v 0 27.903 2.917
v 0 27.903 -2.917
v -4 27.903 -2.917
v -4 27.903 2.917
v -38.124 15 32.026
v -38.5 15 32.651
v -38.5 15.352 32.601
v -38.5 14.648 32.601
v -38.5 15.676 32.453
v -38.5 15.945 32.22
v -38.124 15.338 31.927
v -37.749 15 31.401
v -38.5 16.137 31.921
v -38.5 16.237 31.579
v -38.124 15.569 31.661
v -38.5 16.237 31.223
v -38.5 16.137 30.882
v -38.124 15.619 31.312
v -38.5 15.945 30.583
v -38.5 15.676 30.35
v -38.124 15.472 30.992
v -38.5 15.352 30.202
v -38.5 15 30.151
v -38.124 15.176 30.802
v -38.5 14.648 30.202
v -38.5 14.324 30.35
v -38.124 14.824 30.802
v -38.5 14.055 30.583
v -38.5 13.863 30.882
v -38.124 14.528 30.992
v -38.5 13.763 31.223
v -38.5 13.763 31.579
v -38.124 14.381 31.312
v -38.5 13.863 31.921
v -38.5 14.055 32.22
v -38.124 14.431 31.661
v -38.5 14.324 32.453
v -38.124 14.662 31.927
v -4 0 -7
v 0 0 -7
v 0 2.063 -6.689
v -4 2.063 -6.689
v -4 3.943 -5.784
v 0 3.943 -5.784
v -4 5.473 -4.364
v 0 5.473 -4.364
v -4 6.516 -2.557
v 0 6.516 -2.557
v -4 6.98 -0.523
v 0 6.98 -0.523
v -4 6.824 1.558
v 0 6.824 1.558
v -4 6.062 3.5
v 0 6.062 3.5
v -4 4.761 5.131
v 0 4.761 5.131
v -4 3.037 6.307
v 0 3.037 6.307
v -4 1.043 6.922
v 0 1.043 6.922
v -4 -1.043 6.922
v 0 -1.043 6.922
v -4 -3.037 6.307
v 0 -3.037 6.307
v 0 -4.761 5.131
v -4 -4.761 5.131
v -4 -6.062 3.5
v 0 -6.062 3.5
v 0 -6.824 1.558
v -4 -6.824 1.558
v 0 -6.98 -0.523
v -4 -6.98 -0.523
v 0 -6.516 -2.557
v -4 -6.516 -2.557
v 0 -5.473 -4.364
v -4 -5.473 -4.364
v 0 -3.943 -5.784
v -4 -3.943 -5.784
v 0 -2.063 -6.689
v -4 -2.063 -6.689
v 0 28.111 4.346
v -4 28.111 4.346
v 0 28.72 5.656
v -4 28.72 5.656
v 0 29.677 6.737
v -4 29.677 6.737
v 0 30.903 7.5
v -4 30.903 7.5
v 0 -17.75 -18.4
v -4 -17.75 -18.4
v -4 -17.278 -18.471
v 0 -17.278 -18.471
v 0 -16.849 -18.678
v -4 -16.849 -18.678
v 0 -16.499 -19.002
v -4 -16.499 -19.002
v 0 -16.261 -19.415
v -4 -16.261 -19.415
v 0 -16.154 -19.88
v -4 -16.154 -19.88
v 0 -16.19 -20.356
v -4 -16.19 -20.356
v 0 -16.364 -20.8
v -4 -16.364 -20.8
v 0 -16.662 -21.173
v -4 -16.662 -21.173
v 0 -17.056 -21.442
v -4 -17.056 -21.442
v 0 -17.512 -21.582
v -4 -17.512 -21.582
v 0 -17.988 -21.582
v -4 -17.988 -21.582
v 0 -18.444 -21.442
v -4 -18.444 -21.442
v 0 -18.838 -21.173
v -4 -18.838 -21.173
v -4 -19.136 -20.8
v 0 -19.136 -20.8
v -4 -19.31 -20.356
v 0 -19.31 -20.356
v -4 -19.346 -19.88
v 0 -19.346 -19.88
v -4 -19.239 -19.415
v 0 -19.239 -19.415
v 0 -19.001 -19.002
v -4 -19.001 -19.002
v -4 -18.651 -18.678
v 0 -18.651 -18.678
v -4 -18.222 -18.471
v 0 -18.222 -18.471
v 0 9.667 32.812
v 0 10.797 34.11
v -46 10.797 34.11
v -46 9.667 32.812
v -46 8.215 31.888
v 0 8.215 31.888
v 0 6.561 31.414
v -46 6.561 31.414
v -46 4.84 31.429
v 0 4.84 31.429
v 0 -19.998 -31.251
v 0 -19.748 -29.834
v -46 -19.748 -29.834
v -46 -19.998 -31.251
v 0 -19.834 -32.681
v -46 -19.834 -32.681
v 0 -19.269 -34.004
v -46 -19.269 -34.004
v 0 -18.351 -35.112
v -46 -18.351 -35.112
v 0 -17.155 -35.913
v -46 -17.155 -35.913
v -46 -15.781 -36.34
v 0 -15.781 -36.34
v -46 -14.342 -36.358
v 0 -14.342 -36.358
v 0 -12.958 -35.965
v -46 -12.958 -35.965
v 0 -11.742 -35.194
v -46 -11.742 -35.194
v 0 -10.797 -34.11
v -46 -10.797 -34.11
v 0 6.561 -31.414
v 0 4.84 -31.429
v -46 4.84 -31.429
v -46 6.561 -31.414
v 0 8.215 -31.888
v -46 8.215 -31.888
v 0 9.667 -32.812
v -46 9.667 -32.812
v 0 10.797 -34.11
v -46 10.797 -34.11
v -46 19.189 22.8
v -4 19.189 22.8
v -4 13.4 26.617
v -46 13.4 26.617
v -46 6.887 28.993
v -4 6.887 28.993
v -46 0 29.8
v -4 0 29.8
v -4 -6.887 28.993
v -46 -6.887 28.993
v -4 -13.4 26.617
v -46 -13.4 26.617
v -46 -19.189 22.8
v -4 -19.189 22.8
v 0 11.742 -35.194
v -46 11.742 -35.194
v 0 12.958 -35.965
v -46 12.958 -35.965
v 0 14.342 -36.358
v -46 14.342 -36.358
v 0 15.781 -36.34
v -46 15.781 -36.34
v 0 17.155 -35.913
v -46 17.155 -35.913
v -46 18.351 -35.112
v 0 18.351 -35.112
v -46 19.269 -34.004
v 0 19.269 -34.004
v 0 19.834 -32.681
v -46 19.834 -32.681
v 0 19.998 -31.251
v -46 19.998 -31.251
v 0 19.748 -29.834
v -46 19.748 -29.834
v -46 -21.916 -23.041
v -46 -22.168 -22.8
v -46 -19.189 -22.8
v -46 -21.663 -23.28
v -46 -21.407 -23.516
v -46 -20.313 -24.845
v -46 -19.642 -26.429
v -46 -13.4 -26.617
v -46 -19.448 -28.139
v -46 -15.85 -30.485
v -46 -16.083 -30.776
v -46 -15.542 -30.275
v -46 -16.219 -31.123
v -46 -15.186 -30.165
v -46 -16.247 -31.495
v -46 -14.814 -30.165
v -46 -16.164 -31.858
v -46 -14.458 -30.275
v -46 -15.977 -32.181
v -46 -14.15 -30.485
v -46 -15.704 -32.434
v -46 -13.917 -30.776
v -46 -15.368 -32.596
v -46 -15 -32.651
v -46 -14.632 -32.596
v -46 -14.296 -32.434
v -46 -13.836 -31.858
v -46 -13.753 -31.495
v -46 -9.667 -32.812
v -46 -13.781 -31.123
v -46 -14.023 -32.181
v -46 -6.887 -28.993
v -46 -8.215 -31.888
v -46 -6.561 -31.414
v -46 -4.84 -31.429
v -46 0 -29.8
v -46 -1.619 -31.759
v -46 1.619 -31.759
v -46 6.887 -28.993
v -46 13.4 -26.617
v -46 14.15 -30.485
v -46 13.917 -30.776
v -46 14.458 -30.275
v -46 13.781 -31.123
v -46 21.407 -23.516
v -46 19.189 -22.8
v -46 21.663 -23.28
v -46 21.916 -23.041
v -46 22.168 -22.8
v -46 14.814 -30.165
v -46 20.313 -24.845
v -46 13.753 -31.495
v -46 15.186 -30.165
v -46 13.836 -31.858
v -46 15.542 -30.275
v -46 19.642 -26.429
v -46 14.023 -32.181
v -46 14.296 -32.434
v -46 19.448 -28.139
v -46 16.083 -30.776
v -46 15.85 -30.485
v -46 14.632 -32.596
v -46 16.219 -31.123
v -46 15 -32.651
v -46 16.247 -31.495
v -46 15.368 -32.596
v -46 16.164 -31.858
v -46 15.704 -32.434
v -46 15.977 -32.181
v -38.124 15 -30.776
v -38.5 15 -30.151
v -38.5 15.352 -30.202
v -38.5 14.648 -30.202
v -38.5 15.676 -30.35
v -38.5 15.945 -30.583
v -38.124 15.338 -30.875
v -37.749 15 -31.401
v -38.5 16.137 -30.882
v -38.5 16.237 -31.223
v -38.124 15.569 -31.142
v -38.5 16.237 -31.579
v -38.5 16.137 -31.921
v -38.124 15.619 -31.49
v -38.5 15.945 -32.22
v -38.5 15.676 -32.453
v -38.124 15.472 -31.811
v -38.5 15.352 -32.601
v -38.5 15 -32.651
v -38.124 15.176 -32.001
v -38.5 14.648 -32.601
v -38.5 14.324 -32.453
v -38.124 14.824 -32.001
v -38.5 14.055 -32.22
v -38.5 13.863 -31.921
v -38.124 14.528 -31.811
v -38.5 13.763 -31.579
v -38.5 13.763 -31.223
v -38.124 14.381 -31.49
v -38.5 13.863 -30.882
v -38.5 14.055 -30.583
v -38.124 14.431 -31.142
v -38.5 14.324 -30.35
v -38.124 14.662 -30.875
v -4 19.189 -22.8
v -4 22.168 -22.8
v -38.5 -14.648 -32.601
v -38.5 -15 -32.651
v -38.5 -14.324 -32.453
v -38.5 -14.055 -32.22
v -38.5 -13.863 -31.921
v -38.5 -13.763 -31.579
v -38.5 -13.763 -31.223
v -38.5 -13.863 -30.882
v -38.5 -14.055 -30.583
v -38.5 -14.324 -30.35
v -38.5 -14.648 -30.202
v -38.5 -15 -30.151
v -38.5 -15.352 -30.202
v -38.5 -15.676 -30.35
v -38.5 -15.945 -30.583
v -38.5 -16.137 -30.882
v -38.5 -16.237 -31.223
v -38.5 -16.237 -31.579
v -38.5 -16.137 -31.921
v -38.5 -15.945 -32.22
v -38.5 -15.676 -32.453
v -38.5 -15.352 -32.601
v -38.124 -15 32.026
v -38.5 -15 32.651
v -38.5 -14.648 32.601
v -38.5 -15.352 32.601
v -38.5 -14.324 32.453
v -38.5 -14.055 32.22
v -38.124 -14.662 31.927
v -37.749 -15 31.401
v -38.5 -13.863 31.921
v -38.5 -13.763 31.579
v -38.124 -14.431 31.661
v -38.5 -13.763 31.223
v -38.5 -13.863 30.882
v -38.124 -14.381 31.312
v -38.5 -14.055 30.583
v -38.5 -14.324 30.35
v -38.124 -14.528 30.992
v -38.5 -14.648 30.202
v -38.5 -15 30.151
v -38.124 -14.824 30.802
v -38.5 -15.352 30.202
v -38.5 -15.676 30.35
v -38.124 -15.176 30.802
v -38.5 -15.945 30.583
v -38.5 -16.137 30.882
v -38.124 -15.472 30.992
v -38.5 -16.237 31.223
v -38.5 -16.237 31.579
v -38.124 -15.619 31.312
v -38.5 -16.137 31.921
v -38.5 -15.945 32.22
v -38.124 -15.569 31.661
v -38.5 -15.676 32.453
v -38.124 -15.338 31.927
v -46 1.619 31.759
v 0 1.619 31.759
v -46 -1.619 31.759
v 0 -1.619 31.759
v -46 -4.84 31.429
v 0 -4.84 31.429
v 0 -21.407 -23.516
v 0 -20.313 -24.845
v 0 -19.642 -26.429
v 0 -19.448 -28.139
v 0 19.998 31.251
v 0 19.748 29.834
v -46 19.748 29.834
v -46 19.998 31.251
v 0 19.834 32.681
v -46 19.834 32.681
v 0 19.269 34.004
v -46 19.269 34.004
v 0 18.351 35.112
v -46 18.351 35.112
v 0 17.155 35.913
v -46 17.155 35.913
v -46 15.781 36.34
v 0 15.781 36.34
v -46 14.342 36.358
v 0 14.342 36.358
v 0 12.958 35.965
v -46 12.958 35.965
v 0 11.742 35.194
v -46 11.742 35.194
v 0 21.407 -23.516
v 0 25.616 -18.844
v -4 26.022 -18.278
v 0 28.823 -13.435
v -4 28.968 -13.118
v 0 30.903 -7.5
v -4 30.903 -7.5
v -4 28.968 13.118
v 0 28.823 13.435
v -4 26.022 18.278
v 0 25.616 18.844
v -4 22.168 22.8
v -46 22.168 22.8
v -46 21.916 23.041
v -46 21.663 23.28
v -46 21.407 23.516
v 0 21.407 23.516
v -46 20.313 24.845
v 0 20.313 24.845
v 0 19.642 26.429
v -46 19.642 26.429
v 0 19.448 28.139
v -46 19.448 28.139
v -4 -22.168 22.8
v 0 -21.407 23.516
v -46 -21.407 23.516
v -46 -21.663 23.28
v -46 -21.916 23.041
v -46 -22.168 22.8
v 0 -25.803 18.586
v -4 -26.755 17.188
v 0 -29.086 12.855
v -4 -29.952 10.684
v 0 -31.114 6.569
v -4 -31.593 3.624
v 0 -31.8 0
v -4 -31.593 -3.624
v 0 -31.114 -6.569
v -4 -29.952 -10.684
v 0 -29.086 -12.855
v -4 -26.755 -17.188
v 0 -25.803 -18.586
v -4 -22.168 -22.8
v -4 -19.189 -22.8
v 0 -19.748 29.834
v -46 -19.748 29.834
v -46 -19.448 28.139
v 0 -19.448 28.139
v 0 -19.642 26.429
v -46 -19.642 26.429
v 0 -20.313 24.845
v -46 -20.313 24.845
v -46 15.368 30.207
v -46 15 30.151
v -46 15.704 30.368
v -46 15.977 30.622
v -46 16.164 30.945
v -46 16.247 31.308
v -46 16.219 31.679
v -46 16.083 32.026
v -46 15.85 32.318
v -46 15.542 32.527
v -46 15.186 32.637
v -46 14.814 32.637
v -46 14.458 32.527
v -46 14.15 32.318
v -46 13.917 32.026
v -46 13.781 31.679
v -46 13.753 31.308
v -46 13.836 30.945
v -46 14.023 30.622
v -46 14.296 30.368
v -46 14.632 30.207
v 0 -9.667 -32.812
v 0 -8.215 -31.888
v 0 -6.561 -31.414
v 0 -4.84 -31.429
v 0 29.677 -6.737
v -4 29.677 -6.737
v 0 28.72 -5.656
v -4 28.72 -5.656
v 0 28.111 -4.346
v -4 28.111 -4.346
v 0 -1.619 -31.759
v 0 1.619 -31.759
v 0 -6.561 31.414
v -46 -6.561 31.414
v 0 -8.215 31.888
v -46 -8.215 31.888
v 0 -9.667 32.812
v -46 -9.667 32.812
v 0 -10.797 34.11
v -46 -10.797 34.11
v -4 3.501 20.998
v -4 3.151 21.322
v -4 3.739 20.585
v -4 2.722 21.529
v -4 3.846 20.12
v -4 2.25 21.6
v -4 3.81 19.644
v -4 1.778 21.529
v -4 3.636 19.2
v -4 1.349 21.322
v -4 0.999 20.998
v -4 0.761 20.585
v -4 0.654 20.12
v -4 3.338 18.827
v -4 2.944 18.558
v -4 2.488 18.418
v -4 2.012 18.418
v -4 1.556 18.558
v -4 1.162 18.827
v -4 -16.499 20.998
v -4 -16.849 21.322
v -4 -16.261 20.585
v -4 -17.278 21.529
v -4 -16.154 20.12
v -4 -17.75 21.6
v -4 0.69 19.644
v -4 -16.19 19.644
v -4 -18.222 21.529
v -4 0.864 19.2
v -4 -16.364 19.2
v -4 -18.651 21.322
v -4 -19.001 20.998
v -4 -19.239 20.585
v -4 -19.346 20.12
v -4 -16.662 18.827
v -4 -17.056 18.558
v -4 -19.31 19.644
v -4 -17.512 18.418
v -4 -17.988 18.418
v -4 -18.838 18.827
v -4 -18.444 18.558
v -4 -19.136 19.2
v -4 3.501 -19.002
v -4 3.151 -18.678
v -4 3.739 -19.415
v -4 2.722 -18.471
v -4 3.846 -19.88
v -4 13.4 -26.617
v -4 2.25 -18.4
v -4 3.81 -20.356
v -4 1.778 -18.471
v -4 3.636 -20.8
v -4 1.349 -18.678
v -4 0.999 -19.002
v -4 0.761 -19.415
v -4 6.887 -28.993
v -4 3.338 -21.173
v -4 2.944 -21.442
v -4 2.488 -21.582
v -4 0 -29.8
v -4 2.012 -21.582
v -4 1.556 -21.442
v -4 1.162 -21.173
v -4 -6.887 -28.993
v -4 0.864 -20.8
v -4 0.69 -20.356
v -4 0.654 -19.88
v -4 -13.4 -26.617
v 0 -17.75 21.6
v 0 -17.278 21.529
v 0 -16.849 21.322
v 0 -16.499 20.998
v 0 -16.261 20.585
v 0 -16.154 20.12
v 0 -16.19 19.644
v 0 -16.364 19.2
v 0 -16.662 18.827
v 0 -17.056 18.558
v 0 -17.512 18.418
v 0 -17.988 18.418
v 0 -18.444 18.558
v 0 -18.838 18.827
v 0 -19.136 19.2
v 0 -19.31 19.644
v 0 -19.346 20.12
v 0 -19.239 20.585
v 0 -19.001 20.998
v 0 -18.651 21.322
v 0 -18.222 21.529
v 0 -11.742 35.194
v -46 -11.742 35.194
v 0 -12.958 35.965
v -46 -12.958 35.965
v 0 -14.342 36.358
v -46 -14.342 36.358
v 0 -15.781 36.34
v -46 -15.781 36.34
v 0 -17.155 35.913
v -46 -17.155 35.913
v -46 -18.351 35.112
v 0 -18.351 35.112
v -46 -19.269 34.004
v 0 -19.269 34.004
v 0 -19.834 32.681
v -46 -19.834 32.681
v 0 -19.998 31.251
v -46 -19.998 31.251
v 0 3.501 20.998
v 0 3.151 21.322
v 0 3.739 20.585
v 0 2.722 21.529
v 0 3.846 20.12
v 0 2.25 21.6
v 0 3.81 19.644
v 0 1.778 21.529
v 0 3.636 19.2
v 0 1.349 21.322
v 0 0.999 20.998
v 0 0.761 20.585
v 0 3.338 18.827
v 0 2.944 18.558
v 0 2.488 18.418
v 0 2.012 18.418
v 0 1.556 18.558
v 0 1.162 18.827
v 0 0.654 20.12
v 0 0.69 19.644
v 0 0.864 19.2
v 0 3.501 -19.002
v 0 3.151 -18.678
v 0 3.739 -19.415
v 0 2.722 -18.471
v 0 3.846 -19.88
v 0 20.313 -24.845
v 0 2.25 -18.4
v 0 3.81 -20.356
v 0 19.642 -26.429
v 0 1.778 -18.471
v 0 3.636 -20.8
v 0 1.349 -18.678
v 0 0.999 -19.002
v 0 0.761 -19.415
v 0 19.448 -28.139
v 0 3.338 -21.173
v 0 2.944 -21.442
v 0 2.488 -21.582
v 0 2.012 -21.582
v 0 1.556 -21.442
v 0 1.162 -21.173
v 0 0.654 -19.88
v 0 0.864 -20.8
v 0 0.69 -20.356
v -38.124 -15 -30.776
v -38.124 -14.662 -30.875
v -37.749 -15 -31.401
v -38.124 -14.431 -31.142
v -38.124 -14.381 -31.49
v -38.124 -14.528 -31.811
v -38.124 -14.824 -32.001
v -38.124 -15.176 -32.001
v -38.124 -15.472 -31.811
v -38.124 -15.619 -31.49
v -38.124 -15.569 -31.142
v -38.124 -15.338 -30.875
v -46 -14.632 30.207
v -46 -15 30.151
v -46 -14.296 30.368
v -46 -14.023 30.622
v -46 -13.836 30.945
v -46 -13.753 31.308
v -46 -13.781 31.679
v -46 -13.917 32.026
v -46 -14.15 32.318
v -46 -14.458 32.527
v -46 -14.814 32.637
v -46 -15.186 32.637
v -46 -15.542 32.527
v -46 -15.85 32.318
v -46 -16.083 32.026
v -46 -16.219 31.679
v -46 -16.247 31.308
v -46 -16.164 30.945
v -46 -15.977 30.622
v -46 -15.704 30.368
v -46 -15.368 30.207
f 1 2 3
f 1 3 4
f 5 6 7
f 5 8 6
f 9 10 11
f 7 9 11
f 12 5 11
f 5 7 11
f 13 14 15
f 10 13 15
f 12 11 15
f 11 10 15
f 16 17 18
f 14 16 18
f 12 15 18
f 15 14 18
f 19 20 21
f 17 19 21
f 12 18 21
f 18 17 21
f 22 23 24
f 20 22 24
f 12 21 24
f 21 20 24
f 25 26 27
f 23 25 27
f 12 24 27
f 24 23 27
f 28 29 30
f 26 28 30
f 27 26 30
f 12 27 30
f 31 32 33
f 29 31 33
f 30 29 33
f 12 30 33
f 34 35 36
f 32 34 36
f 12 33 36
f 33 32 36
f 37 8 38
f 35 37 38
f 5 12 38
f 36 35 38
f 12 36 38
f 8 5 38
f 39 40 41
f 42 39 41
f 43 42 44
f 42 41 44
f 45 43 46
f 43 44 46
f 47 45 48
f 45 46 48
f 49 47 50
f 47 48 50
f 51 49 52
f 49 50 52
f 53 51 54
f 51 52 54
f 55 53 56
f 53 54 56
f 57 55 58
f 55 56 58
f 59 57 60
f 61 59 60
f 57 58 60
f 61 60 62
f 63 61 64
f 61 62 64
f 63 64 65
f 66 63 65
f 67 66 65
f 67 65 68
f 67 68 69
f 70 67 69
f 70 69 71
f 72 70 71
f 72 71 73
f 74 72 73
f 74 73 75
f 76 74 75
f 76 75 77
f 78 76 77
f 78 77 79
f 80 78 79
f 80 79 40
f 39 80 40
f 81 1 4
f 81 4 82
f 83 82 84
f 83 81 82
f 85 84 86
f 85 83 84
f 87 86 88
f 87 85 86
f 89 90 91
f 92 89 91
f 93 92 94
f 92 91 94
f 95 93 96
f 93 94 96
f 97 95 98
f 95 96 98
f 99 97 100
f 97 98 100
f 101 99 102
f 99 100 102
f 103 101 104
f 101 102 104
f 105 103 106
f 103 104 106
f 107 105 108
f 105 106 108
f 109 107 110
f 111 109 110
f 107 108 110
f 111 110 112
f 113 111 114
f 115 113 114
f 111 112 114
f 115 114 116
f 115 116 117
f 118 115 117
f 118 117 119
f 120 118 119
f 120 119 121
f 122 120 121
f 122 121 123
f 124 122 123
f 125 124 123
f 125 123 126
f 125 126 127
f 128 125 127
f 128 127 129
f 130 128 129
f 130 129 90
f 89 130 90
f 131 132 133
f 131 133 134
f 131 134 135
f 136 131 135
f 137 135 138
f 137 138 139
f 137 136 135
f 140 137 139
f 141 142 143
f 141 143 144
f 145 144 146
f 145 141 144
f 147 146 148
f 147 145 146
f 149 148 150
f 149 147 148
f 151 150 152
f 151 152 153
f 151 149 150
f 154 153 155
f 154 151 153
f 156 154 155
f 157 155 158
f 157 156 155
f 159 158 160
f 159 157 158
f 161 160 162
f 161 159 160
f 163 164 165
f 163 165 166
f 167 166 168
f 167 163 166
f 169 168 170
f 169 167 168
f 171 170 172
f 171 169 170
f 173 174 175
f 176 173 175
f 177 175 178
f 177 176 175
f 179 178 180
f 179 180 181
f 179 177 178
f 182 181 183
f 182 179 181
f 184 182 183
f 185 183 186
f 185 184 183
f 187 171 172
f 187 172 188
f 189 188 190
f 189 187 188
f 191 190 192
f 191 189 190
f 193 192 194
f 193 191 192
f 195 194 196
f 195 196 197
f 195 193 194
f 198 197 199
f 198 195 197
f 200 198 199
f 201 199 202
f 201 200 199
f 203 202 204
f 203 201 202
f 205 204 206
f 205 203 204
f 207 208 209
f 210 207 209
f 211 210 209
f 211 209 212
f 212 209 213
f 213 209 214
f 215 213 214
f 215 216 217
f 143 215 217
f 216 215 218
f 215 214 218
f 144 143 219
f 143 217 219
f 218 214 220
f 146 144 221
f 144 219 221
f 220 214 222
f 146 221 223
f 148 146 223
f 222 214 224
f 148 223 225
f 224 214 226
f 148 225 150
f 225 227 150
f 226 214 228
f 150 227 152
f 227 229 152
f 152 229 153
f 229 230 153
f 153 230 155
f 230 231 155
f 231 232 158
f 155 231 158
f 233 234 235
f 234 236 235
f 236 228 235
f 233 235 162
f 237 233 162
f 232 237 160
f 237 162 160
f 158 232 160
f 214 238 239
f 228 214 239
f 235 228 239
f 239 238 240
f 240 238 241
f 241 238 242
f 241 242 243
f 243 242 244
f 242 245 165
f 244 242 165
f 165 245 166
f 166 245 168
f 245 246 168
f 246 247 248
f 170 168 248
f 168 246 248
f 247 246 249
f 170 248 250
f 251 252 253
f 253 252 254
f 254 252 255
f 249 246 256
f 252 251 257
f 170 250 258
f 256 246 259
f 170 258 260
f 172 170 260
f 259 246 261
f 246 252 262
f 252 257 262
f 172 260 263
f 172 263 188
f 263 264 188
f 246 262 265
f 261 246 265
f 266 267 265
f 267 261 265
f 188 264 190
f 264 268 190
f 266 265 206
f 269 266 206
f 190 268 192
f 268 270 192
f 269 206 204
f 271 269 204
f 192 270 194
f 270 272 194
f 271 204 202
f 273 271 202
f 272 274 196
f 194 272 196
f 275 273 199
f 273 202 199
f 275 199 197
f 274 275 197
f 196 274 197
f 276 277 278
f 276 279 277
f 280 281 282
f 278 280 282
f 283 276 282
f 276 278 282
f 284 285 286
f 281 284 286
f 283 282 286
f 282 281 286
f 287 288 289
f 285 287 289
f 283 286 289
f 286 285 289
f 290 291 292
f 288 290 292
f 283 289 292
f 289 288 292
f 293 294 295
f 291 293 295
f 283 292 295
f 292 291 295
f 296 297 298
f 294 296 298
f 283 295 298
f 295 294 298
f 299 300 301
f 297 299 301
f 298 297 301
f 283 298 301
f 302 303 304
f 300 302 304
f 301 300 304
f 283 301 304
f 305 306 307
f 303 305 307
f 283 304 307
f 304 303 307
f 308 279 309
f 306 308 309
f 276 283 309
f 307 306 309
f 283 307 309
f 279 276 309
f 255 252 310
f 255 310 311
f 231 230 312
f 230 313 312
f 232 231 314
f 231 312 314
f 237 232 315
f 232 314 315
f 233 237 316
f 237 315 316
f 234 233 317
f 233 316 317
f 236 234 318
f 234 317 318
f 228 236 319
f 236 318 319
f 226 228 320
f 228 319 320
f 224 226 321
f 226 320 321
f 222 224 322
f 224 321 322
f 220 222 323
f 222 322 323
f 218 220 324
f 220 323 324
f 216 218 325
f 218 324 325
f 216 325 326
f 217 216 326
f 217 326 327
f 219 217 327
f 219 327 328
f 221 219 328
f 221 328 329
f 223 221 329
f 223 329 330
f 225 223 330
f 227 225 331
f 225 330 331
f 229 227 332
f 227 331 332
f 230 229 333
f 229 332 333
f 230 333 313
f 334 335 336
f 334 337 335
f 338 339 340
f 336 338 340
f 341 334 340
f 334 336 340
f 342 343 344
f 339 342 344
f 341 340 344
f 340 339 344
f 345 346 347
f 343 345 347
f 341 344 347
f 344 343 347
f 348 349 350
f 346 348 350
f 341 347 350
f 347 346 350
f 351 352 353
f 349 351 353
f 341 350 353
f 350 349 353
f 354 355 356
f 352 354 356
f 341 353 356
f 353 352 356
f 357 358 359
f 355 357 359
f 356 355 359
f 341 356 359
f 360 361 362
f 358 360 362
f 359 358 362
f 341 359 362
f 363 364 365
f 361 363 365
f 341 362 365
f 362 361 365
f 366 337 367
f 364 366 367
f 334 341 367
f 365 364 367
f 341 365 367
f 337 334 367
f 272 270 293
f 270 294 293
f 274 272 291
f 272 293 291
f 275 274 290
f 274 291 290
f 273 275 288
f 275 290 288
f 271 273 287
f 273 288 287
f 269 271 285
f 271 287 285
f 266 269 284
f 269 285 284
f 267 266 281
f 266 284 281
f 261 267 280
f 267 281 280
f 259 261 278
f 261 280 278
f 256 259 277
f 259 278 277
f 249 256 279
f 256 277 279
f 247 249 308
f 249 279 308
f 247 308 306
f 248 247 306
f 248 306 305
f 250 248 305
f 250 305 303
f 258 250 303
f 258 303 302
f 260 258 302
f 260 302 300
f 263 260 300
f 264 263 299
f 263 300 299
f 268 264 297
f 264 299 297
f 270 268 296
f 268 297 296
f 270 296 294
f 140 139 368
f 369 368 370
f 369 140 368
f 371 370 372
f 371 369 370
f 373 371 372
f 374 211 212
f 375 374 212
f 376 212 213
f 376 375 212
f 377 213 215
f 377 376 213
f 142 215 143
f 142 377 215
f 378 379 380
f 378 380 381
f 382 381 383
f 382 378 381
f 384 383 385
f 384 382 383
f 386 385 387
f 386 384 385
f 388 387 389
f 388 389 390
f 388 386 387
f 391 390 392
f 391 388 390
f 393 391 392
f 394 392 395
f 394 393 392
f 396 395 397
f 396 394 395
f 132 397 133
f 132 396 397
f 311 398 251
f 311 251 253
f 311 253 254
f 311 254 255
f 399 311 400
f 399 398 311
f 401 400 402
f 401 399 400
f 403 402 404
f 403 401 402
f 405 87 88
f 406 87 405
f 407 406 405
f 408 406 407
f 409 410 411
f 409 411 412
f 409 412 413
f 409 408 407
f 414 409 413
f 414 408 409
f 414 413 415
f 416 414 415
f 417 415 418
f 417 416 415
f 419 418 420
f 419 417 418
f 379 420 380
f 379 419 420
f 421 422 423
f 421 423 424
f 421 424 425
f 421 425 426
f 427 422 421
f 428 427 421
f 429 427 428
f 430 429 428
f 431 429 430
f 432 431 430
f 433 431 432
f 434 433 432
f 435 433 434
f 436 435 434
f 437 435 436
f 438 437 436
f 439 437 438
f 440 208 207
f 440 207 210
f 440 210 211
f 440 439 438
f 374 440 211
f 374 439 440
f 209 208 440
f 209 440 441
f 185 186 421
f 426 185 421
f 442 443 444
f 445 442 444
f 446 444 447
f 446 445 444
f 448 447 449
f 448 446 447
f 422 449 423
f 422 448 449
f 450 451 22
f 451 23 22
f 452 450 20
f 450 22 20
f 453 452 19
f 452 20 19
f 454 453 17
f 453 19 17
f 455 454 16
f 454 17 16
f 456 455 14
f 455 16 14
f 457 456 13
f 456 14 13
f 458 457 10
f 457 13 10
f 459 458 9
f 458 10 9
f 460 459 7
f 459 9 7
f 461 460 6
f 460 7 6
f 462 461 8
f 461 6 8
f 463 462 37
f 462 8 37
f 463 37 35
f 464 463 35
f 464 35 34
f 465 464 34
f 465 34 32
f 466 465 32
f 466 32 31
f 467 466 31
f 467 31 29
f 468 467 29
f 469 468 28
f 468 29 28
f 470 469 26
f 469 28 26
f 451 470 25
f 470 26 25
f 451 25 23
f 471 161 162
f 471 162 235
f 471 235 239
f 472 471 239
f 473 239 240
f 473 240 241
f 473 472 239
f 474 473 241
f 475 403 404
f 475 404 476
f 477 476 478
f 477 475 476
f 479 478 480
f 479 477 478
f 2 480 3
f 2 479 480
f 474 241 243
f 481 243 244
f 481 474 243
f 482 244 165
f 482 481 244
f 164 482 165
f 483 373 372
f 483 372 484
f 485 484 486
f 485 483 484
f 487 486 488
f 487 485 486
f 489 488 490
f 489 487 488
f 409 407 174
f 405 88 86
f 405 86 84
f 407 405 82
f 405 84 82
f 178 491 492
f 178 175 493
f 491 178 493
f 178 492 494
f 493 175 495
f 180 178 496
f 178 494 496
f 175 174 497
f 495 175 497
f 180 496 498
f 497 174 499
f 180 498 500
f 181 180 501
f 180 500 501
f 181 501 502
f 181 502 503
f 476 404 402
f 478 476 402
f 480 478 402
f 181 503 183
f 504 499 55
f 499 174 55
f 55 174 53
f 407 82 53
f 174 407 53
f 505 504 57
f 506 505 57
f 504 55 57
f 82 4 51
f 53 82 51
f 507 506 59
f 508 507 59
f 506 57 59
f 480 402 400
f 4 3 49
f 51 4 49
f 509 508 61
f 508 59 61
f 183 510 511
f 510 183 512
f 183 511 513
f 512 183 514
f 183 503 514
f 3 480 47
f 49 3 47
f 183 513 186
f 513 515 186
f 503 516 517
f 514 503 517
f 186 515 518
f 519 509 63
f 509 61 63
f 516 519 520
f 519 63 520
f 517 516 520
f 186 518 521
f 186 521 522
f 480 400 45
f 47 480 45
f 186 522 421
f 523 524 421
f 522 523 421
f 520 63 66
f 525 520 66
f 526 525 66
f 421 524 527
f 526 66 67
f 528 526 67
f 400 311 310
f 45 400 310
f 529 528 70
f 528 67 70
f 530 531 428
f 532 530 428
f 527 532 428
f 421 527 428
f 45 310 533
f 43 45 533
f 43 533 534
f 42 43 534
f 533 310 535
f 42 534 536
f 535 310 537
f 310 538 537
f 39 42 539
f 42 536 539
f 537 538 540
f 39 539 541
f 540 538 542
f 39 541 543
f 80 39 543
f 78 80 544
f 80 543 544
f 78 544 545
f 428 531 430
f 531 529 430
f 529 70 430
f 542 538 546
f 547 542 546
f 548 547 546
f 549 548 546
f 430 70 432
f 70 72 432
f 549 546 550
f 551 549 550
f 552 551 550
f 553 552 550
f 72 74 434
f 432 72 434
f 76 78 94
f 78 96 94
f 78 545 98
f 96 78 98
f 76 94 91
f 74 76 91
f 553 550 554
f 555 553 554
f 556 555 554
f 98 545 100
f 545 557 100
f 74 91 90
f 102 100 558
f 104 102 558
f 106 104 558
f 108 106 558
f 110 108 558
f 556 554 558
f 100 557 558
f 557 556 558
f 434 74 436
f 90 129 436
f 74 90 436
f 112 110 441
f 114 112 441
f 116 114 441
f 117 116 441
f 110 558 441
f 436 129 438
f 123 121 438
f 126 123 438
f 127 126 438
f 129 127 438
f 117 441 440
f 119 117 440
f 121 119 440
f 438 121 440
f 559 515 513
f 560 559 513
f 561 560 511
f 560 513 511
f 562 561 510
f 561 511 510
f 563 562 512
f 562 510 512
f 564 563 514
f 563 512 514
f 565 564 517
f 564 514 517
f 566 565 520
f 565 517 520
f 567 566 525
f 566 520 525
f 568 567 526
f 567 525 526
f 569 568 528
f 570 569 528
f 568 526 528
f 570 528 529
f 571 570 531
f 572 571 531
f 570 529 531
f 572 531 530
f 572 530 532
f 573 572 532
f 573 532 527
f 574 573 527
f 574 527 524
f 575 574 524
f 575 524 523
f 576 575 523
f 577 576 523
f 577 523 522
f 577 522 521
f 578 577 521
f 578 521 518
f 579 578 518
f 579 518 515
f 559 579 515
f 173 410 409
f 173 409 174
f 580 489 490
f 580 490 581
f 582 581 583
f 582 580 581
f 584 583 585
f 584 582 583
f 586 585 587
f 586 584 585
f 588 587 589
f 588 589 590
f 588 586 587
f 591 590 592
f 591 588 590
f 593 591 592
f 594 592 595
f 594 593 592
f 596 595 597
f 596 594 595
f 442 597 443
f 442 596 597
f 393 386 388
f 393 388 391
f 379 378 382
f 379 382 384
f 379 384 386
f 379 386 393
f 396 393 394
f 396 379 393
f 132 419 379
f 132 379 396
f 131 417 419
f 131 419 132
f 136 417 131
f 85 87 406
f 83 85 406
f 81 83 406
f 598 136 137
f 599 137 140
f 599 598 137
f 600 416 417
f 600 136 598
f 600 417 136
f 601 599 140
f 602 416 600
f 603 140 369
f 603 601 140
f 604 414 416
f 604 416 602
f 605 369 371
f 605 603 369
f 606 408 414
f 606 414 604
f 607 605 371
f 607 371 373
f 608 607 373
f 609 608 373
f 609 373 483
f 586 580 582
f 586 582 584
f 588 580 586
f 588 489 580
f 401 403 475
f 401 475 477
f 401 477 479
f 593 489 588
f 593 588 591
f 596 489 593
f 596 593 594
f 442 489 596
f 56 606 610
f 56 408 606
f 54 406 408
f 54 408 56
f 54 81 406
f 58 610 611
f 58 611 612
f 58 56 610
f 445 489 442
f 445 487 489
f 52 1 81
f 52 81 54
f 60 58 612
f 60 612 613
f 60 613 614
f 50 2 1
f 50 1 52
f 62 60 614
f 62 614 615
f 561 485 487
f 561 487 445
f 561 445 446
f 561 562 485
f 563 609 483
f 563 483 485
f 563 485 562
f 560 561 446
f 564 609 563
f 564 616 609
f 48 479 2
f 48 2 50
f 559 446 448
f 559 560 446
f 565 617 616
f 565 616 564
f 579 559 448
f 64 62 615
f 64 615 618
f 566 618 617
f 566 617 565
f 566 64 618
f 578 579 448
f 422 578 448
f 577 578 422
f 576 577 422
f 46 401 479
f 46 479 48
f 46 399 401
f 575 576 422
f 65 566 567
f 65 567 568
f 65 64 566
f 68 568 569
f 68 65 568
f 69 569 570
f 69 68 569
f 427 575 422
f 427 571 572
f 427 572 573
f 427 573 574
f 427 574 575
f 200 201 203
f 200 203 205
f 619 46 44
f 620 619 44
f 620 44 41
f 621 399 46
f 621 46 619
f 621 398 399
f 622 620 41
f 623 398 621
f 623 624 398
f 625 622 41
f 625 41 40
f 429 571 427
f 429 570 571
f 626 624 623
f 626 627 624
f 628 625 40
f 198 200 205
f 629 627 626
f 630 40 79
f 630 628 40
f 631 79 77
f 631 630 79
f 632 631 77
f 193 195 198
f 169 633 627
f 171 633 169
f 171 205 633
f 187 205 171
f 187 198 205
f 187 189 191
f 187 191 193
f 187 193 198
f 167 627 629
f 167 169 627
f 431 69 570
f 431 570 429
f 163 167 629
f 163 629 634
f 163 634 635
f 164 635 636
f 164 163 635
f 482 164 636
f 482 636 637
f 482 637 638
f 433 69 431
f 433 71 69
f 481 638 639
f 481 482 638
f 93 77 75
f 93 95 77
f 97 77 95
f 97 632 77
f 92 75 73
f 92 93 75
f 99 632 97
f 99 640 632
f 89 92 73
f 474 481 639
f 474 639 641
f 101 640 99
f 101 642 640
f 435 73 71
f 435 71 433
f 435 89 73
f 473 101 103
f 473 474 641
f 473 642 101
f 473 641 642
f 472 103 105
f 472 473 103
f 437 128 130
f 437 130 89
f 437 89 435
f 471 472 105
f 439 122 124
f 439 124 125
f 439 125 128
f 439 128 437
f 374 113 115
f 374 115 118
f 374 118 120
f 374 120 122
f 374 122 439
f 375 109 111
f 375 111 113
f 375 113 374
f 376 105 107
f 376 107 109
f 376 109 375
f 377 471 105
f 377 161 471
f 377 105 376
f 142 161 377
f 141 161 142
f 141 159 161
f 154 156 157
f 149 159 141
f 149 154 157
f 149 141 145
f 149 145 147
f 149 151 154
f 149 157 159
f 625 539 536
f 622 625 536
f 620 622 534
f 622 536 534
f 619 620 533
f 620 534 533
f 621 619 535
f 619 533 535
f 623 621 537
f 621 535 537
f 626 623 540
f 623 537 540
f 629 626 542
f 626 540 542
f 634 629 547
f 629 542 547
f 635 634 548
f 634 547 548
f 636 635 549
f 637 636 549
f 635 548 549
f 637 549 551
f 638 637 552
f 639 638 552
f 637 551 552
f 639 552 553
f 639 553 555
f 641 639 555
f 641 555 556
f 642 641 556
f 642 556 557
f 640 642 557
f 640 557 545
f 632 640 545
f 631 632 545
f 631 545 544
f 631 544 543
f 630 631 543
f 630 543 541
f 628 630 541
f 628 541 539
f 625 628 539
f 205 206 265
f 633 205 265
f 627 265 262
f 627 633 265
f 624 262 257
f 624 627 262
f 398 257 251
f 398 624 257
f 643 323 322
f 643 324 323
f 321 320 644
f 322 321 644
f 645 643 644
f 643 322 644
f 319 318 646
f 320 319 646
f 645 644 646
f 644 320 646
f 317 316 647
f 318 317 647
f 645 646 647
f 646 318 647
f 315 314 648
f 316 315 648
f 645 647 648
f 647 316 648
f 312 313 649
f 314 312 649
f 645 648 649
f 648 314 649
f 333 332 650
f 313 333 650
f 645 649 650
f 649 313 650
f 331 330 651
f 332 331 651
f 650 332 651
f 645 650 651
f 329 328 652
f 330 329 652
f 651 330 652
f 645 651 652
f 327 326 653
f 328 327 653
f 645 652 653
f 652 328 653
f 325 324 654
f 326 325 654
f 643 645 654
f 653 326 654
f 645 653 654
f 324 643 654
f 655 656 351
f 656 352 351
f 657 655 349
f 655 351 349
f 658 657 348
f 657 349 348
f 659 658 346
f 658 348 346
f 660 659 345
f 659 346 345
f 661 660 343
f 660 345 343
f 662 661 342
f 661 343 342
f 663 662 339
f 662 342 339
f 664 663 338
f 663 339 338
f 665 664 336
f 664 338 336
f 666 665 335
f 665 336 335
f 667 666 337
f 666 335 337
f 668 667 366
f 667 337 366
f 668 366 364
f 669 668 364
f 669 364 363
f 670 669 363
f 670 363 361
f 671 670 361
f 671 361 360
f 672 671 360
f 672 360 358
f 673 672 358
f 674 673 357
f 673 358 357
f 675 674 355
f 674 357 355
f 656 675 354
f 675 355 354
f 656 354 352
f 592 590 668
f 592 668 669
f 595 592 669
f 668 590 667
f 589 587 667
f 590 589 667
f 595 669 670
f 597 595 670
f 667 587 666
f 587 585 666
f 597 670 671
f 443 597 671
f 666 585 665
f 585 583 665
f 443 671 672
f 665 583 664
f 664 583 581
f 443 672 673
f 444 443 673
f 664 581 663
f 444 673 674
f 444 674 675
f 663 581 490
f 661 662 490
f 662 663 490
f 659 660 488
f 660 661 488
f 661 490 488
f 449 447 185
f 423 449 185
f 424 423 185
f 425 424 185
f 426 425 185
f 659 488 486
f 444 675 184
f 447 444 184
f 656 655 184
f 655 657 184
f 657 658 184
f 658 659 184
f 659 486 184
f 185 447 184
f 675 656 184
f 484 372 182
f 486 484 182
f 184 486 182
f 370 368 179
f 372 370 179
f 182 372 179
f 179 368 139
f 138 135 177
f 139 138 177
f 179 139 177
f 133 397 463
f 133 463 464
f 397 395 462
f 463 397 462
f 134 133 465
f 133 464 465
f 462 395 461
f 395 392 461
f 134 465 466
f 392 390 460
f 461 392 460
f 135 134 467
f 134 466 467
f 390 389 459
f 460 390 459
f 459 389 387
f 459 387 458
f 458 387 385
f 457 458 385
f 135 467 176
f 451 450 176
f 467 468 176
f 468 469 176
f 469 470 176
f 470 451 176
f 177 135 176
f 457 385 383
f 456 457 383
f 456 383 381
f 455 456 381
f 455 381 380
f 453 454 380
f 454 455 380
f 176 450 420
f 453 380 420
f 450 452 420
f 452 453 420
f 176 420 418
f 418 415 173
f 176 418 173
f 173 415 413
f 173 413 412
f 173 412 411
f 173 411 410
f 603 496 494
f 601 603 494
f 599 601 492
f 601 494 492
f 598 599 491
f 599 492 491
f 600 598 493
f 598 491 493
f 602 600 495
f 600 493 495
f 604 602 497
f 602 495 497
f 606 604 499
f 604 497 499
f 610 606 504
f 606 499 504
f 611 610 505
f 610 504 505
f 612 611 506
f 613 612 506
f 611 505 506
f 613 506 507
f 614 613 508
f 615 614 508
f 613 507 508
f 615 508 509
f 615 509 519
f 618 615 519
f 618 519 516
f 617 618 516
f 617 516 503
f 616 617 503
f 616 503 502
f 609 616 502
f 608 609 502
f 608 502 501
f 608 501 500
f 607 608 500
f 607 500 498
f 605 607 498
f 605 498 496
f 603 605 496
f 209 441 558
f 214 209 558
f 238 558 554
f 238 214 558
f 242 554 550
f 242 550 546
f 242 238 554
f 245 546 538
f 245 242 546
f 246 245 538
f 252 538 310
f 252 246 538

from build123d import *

# Parameters (mm, degrees)
SKETCH7_R                = 7
BOSS_EXTRUDE1_DEPTH      = 46
CUT_EXTRUDE1_START       = -46
CUT_EXTRUDE1_OUTLINE_R   = 7
CUT_EXTRUDE1_DEPTH       = 42
M3_CLEARANCE_HOLE1_D     = 3.2
M3_CLEARANCE_HOLE1_DEPTH = 5
M3_CLEARANCE_HOLE1_TIP   = 0.96137699
M3_TAPPED_HOLE1_D        = 2.5
M3_TAPPED_HOLE1_DEPTH    = 7.5
M3_TAPPED_HOLE1_TIP      = 0.751075774
FILLET1_R                = 5


# Read off the part's stored shape, not the designer's step: Cut-Extrude1
with BuildPart() as part:
    # Sketch7 → Boss-Extrude1 (new body)
    with BuildSketch(Plane(origin=(0, 0, 0), x_dir=(0, 0, -1), z_dir=(1, 0, 0))):
        with BuildLine():
            Line((-7.5, 27.902912484), (-7.5, 30.902912484))
            ThreePointArc((-7.5, 30.902912484), (-16.218584434, 27.353199428), (-23.515946886, 21.40654671))
            ThreePointArc((-23.515946886, 21.40654671), (-26.429411238, 19.642162968), (-29.833839376, 19.747962631))
            ThreePointArc((-29.833839376, 19.747962631), (-35.912951138, 17.155172414), (-34.109592252, 10.797023497))
            ThreePointArc((-34.109592252, 10.797023497), (-31.887887506, 8.215289092), (-31.429483161, 4.840205393))
            ThreePointArc((-31.429483161, 4.840205393), (-31.8, 0), (-31.429483161, -4.840205393))
            ThreePointArc((-31.429483161, -4.840205393), (-31.887887506, -8.215289092), (-34.109592252, -10.797023497))
            ThreePointArc((-34.109592252, -10.797023497), (-35.912951138, -17.155172414), (-29.833839376, -19.747962631))
            ThreePointArc((-29.833839376, -19.747962631), (-26.429411238, -19.642162968), (-23.515946886, -21.40654671))
            ThreePointArc((-23.515946886, -21.40654671), (0, -31.8), (23.515946886, -21.40654671))
            ThreePointArc((23.515946886, -21.40654671), (26.429411238, -19.642162968), (29.833839376, -19.747962631))
            ThreePointArc((29.833839376, -19.747962631), (35.912951138, -17.155172414), (34.109592252, -10.797023497))
            ThreePointArc((34.109592252, -10.797023497), (31.887887506, -8.215289092), (31.429483161, -4.840205393))
            ThreePointArc((31.429483161, -4.840205393), (31.8, 0), (31.429483161, 4.840205393))
            ThreePointArc((31.429483161, 4.840205393), (31.887887506, 8.215289092), (34.109592252, 10.797023497))
            ThreePointArc((34.109592252, 10.797023497), (35.912951138, 17.155172414), (29.833839376, 19.747962631))
            ThreePointArc((29.833839376, 19.747962631), (26.429411238, 19.642162968), (23.515946886, 21.40654671))
            ThreePointArc((23.515946886, 21.40654671), (16.218584434, 27.353199428), (7.5, 30.902912484))
            Line((7.5, 30.902912484), (7.5, 27.902912484))
            Line((7.5, 27.902912484), (-7.5, 27.902912484))
        make_face()
        Circle(SKETCH7_R, mode=Mode.SUBTRACT)
    extrude(amount=-BOSS_EXTRUDE1_DEPTH)

    # Cut-Extrude1 outline → Cut-Extrude1 (cut)
    with BuildSketch(Plane(origin=(0, 0, 0), x_dir=(0, 0, -1), z_dir=(1, 0, 0)).offset(CUT_EXTRUDE1_START)):
        with BuildLine():
            ThreePointArc((-22.8, 19.188538246), (-29.8, 0), (-22.8, -19.188538246))
            Line((-22.8, -19.188538246), (-22.8, -22.167543842))
            ThreePointArc((-22.8, -22.167543842), (0, -31.8), (22.8, -22.167543842))
            Line((22.8, -22.167543842), (22.8, -19.188538246))
            ThreePointArc((22.8, -19.188538246), (29.8, 0), (22.8, 19.188538246))
            Line((22.8, 19.188538246), (22.8, 22.167543842))
            ThreePointArc((22.8, 22.167543842), (15.767027822, 27.615952521), (7.5, 30.902912484))
            Line((7.5, 30.902912484), (7.5, 27.902912484))
            Line((7.5, 27.902912484), (-7.5, 27.902912484))
            Line((-7.5, 27.902912484), (-7.5, 30.902912484))
            ThreePointArc((-7.5, 30.902912484), (-15.767027822, 27.615952521), (-22.8, 22.167543842))
            Line((-22.8, 22.167543842), (-22.8, 19.188538246))
        make_face()
        Circle(CUT_EXTRUDE1_OUTLINE_R, mode=Mode.SUBTRACT)
    extrude(amount=CUT_EXTRUDE1_DEPTH, mode=Mode.SUBTRACT)

    # M3 Clearance Hole1
    with Locations(Plane(origin=(0, 0, 0), x_dir=(0, 0, -1), z_dir=(1, 0, 0))):
        with Locations((-20, 2.25), (20, 2.25), (20, -17.75), (-20, -17.75)):
            Hole(M3_CLEARANCE_HOLE1_D / 2, depth=M3_CLEARANCE_HOLE1_DEPTH)
            with Locations((0, 0, -(M3_CLEARANCE_HOLE1_DEPTH + M3_CLEARANCE_HOLE1_TIP / 2))):  # 118° drill point
                Cone(0, M3_CLEARANCE_HOLE1_D / 2, M3_CLEARANCE_HOLE1_TIP, mode=Mode.SUBTRACT)

    # M3 Tapped Hole1
    with Locations(Plane.ZY.offset(46)):
        with Locations((-31.40127386, 15), (-31.40127386, -15), (31.40127386, -15), (31.40127386, 15)):
            Hole(M3_TAPPED_HOLE1_D / 2, depth=M3_TAPPED_HOLE1_DEPTH)
            with Locations((0, 0, -(M3_TAPPED_HOLE1_DEPTH + M3_TAPPED_HOLE1_TIP / 2))):  # 118° drill point
                Cone(0, M3_TAPPED_HOLE1_D / 2, M3_TAPPED_HOLE1_TIP, mode=Mode.SUBTRACT)

    # Fillet1
    # the kernel refuses this fillet: 5 mm, written as the material it adds along each edge
    with BuildSketch(Plane(origin=(0, 27.902912484, 7.5), x_dir=(0, 0, -1), z_dir=(-1, 0, 0))) as fillet1_piece_1:
        with BuildLine():
            CenterArc((4.582575695, -5), FILLET1_R, 90, 66.421821522)
            Line((0, -3), (-0.091651514, -2.96))
            ThreePointArc((-0.091651514, -2.96), (-0.1, -1.5), (-0.1, 0))
            Line((-0.1, 0), (0, 0.1))
            Line((0, 0.1), (4.582575695, 0.1))
            Line((4.582575695, 0.1), (4.582575695, 0))
        make_face()
    extrude(amount=4)
    with BuildSketch(Plane(origin=(0, 27.902912484, -7.5), x_dir=(0, 1, 0), z_dir=(-1, 0, 0))) as fillet1_piece_2:
        with BuildLine():
            CenterArc((5, -4.582575695), FILLET1_R, 113.578178478, 66.421821522)
            Line((0, -4.582575695), (-0.1, -4.582575695))
            Line((-0.1, -4.582575695), (-0.1, 0))
            Line((-0.1, 0), (0, 0.1))
            ThreePointArc((0, 0.1), (1.5, 0.1), (2.96, 0.091651514))
            Line((2.96, 0.091651514), (3, 0))
        make_face()
    extrude(amount=4)


solid = part.part
